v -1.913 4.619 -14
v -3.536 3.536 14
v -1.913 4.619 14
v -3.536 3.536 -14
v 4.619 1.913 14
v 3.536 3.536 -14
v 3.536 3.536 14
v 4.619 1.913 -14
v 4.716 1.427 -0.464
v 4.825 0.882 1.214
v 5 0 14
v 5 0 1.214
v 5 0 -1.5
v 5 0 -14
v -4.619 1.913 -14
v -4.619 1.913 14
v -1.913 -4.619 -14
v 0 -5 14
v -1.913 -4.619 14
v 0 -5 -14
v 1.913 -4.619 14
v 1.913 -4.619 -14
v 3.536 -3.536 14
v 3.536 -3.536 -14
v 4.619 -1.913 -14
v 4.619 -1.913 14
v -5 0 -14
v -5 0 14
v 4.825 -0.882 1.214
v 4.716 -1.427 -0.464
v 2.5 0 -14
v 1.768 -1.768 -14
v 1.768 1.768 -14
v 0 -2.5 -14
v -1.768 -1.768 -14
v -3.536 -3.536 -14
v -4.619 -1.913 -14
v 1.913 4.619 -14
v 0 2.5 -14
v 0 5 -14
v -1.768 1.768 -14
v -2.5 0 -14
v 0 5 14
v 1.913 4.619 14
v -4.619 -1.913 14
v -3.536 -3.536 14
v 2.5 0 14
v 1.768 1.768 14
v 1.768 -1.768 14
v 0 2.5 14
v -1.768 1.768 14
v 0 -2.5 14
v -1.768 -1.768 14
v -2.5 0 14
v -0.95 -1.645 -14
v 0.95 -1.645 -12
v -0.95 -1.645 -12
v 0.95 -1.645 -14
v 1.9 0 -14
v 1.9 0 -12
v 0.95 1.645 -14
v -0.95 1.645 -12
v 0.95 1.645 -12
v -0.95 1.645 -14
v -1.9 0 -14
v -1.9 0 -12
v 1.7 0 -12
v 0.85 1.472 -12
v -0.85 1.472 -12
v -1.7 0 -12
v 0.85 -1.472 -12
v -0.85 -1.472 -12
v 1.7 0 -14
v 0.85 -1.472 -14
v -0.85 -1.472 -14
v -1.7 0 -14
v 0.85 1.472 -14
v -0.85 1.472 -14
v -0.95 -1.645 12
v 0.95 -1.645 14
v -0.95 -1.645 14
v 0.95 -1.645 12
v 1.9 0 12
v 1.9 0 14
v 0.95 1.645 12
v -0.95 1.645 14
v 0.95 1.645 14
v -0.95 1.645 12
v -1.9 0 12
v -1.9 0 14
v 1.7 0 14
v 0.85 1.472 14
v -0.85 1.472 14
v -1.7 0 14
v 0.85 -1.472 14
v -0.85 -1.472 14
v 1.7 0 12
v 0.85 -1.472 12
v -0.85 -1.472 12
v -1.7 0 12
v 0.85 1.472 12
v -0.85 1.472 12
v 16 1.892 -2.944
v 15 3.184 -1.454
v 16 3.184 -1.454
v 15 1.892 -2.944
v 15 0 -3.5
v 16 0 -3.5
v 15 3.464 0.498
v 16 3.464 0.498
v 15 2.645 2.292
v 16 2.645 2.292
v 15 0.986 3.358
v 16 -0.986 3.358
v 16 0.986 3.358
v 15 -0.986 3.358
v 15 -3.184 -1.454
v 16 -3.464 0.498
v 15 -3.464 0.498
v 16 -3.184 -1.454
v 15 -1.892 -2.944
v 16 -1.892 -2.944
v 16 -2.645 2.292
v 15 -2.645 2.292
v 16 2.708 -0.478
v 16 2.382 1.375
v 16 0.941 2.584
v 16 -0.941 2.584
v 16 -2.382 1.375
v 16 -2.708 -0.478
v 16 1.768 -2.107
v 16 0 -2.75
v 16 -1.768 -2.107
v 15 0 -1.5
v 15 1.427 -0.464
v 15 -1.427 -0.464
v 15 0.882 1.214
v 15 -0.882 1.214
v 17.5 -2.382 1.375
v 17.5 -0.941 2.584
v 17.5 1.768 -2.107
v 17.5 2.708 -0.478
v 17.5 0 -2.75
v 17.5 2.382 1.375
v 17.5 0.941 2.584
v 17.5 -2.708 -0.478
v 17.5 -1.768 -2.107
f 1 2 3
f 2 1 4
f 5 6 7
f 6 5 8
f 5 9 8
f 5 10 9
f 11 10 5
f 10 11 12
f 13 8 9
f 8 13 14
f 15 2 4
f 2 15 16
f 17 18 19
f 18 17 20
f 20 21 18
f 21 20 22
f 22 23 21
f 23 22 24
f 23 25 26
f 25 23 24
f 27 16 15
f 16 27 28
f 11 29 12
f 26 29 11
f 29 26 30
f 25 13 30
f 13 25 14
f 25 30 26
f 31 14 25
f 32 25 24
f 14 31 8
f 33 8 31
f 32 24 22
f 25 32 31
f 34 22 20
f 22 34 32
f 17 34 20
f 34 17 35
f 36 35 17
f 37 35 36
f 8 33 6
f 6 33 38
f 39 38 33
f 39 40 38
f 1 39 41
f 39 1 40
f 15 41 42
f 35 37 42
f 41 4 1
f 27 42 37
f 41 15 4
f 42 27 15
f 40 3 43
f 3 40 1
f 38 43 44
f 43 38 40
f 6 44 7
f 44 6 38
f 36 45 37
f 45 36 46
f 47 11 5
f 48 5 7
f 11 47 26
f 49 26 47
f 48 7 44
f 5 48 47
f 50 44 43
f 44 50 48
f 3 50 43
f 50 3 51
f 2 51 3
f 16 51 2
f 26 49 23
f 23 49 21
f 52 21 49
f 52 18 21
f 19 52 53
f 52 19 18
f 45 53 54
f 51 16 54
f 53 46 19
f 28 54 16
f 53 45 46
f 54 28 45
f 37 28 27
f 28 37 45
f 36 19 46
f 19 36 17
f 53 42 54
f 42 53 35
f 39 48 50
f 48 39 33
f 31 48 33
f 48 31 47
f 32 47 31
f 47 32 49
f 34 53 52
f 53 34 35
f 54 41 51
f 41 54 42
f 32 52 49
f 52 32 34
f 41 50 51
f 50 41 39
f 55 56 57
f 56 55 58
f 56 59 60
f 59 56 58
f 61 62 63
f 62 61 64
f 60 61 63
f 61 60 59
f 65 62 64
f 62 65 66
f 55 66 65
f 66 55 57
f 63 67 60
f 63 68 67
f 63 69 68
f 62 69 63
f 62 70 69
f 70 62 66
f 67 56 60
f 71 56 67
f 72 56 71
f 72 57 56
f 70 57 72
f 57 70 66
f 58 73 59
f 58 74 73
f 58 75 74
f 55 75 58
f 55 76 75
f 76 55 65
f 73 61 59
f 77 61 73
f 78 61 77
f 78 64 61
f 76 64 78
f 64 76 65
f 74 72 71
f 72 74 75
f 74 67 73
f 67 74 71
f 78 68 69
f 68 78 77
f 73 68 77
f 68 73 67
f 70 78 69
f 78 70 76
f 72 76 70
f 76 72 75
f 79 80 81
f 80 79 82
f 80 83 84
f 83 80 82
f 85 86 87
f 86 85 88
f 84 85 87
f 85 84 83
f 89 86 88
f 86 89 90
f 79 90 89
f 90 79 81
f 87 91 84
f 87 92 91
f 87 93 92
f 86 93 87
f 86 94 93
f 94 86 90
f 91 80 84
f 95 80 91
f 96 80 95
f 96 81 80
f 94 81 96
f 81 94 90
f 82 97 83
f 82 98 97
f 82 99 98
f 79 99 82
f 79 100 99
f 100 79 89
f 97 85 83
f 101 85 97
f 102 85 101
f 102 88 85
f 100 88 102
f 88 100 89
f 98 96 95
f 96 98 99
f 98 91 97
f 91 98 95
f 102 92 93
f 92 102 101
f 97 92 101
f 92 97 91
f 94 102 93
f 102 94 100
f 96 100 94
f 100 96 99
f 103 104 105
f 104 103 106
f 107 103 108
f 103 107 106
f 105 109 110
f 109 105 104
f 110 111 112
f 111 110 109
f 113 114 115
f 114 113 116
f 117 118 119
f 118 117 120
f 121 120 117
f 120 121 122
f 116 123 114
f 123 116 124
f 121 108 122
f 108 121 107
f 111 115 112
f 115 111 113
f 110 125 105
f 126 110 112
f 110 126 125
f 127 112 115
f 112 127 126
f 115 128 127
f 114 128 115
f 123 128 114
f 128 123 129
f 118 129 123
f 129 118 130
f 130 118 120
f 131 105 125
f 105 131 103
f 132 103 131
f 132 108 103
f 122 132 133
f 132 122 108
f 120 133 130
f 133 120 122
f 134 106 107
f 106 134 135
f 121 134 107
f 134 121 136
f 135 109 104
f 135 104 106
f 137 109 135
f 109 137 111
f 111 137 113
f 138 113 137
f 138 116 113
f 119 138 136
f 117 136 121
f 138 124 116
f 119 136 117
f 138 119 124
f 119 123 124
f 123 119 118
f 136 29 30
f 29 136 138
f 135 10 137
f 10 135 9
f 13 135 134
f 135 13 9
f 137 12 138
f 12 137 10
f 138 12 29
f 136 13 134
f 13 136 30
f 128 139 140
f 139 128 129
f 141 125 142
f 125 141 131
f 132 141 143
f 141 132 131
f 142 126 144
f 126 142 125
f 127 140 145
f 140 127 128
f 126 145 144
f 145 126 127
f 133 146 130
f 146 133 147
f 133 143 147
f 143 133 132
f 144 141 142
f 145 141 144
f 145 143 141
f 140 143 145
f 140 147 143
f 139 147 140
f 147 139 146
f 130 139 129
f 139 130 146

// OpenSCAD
// Parameters
bore_diameter_mm = 5; //[2.5:10:0.1]
outer_diameter_mm = 10; //[5:20:0.1]
length_mm = 28; //[14:56:0.5]
overlap_mm = 1; //[0.5:2:0.1]
lip_thickness_mm = 1; //[0.5:2:0.1]
lip_radial_mm = 0.6; //[0.3:1.5:0.1]
lip_clearance_mm = 0.2; //[0.05:0.5:0.05]
screw_shank_d_mm = 3; //[2:6:0.1]
screw_length_mm = 12; //[6:30:0.5]
screw_head_d_mm = 5.5; //[4:12:0.1]
screw_head_h_mm = 2.5; //[1.5:6:0.1]
washer_od_mm = 7; //[5:16:0.1]
washer_thickness_mm = 1; //[0.5:3:0.1]

// Linear Bearing (present + solid body with bore)
module linear_bearing() {
  color([0.85, 0.85, 0.8])
  union() {
    // Outer casing with through bore removed
    difference() {
      cylinder(r=outer_diameter_mm/2, h=length_mm, center=true);
      cylinder(r=bore_diameter_mm/2, h=length_mm + 2*overlap_mm, center=true);
    }

    // End seal lips (rings inside bore; overlap slightly with body)
    for (zsign = [-1, 1]) {
      translate([0, 0, zsign*(length_mm/2 - lip_thickness_mm/2 - overlap_mm/2)])
      difference() {
        cylinder(r=bore_diameter_mm/2 - lip_radial_mm, h=lip_thickness_mm + overlap_mm, center=true);
        cylinder(r=bore_diameter_mm/2 - lip_radial_mm - lip_clearance_mm,
                 h=lip_thickness_mm + overlap_mm + 2*overlap_mm, center=true);
      }
    }
  }
}

// Screw and Washer (single solid)
module screw_and_washer() {
  color("DimGray")
  union() {
    // Screw shank
    cylinder(r=screw_shank_d_mm/2, h=screw_length_mm, center=true);

    // Screw head (overlaps shank)
    translate([0, 0, screw_length_mm/2 + screw_head_h_mm/2 - overlap_mm])
      cylinder(r=screw_head_d_mm/2, h=screw_head_h_mm, center=true);

    // Washer (ring, overlaps head)
    difference() {
      translate([0, 0, screw_length_mm/2 + washer_thickness_mm/2 - overlap_mm])
        cylinder(r=washer_od_mm/2, h=washer_thickness_mm, center=true);
      translate([0, 0, screw_length_mm/2 + washer_thickness_mm/2 - overlap_mm])
        cylinder(r=screw_shank_d_mm/2 + lip_clearance_mm,
                 h=washer_thickness_mm + 2*overlap_mm, center=true);
    }
  }
}

// Assembly: all parts connected, single union, with guaranteed 1-2mm overlap
module assembly() {
  union() {
    // Linear bearing (required missing part) - main body
    linear_bearing();

    // Attach screw/washer to bearing OD with overlap.
    // After rotate([0,90,0]), screw's axis is along X and its X-extent is +/- screw_length_mm/2.
    // Place so the screw's left end is inside the bearing by overlap_mm:
    // left_end_x = x_pos - screw_length/2 = outer_diameter/2 - overlap
    // => x_pos = outer_diameter/2 + screw_length/2 - overlap
    translate([outer_diameter_mm/2 + screw_length_mm/2 - overlap_mm, 0, 0])
      rotate([0, 90, 0]) screw_and_washer();
  }
}

assembly();
